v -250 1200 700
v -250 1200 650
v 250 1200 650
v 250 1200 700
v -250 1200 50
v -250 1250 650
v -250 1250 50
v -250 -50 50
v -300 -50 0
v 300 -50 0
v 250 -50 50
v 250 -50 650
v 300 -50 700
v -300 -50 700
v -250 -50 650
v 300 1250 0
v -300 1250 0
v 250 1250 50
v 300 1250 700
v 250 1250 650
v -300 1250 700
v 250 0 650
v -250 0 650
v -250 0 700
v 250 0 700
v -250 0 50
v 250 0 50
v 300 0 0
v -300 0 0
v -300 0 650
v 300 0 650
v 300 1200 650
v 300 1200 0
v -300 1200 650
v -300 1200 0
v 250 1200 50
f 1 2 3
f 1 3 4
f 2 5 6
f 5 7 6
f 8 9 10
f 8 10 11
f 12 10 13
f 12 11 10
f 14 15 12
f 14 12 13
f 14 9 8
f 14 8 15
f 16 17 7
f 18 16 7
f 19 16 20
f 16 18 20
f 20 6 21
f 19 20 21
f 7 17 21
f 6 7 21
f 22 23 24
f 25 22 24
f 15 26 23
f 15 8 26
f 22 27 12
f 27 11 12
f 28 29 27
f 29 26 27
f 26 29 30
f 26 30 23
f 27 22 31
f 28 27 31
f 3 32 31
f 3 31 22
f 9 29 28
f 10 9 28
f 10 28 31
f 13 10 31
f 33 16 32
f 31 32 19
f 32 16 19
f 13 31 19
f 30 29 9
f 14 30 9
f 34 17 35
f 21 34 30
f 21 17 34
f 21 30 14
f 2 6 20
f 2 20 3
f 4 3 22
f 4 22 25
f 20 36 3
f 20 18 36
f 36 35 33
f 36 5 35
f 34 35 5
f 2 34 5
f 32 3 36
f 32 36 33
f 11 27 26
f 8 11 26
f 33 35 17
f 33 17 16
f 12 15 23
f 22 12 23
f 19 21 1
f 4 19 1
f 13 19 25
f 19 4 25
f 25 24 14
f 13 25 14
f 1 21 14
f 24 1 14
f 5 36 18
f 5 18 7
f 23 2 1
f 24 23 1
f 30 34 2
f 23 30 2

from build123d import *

# Parameters (mm, degrees)
F1_DEPTH      = 50
F2_W          = 50
F2_H          = 50
F3_DEPTH      = 600
F5_W          = 50
F5_H          = 50
F6_DEPTH      = 500
F6_DEPTH_BACK = 25


with BuildPart() as f1:
    # F0 (on Front) → F1 (new body)
    with BuildSketch(Plane.XZ):
        Polygon((-300, 700), (-300, 0), (300, 0), (300, 700), (250, 700), (250, 50), (-250, 50), (-250, 700), align=None)
    extrude(amount=F1_DEPTH)

    # F4: F3 across plane


with BuildPart() as f3:
    # F2 (on face) → F3 (new body)
    with BuildSketch(Plane(origin=(0, 0, 0), x_dir=(-1, 0, 0), z_dir=(0, 1, 0))):
        with Locations((-275, 675)):
            Rectangle(F2_W, F2_H)
    extrude(amount=F3_DEPTH)


with BuildPart() as f1_1:
    add(f1.part)
    add(f3.part.mirror(Plane.YZ))


    add(f3.part)  # F6 merges F3
    # F5 (on face) → F6 (join, two sides)
    with BuildSketch(Plane.YZ.offset(-250)) as f6_sk:
        with Locations((-25, 675)):
            Rectangle(F5_W, F5_H)
    extrude(amount=F6_DEPTH)
    extrude(f6_sk.sketch, amount=-F6_DEPTH_BACK)

    # F7: F1 across face


with BuildPart() as f1_2:
    add(f1_1.part)
    add(f1_1.part.mirror(Plane(origin=(275, 600, 675), x_dir=(-1, 0, 0), z_dir=(0, 1, 0))))


solid = f1_2.part
